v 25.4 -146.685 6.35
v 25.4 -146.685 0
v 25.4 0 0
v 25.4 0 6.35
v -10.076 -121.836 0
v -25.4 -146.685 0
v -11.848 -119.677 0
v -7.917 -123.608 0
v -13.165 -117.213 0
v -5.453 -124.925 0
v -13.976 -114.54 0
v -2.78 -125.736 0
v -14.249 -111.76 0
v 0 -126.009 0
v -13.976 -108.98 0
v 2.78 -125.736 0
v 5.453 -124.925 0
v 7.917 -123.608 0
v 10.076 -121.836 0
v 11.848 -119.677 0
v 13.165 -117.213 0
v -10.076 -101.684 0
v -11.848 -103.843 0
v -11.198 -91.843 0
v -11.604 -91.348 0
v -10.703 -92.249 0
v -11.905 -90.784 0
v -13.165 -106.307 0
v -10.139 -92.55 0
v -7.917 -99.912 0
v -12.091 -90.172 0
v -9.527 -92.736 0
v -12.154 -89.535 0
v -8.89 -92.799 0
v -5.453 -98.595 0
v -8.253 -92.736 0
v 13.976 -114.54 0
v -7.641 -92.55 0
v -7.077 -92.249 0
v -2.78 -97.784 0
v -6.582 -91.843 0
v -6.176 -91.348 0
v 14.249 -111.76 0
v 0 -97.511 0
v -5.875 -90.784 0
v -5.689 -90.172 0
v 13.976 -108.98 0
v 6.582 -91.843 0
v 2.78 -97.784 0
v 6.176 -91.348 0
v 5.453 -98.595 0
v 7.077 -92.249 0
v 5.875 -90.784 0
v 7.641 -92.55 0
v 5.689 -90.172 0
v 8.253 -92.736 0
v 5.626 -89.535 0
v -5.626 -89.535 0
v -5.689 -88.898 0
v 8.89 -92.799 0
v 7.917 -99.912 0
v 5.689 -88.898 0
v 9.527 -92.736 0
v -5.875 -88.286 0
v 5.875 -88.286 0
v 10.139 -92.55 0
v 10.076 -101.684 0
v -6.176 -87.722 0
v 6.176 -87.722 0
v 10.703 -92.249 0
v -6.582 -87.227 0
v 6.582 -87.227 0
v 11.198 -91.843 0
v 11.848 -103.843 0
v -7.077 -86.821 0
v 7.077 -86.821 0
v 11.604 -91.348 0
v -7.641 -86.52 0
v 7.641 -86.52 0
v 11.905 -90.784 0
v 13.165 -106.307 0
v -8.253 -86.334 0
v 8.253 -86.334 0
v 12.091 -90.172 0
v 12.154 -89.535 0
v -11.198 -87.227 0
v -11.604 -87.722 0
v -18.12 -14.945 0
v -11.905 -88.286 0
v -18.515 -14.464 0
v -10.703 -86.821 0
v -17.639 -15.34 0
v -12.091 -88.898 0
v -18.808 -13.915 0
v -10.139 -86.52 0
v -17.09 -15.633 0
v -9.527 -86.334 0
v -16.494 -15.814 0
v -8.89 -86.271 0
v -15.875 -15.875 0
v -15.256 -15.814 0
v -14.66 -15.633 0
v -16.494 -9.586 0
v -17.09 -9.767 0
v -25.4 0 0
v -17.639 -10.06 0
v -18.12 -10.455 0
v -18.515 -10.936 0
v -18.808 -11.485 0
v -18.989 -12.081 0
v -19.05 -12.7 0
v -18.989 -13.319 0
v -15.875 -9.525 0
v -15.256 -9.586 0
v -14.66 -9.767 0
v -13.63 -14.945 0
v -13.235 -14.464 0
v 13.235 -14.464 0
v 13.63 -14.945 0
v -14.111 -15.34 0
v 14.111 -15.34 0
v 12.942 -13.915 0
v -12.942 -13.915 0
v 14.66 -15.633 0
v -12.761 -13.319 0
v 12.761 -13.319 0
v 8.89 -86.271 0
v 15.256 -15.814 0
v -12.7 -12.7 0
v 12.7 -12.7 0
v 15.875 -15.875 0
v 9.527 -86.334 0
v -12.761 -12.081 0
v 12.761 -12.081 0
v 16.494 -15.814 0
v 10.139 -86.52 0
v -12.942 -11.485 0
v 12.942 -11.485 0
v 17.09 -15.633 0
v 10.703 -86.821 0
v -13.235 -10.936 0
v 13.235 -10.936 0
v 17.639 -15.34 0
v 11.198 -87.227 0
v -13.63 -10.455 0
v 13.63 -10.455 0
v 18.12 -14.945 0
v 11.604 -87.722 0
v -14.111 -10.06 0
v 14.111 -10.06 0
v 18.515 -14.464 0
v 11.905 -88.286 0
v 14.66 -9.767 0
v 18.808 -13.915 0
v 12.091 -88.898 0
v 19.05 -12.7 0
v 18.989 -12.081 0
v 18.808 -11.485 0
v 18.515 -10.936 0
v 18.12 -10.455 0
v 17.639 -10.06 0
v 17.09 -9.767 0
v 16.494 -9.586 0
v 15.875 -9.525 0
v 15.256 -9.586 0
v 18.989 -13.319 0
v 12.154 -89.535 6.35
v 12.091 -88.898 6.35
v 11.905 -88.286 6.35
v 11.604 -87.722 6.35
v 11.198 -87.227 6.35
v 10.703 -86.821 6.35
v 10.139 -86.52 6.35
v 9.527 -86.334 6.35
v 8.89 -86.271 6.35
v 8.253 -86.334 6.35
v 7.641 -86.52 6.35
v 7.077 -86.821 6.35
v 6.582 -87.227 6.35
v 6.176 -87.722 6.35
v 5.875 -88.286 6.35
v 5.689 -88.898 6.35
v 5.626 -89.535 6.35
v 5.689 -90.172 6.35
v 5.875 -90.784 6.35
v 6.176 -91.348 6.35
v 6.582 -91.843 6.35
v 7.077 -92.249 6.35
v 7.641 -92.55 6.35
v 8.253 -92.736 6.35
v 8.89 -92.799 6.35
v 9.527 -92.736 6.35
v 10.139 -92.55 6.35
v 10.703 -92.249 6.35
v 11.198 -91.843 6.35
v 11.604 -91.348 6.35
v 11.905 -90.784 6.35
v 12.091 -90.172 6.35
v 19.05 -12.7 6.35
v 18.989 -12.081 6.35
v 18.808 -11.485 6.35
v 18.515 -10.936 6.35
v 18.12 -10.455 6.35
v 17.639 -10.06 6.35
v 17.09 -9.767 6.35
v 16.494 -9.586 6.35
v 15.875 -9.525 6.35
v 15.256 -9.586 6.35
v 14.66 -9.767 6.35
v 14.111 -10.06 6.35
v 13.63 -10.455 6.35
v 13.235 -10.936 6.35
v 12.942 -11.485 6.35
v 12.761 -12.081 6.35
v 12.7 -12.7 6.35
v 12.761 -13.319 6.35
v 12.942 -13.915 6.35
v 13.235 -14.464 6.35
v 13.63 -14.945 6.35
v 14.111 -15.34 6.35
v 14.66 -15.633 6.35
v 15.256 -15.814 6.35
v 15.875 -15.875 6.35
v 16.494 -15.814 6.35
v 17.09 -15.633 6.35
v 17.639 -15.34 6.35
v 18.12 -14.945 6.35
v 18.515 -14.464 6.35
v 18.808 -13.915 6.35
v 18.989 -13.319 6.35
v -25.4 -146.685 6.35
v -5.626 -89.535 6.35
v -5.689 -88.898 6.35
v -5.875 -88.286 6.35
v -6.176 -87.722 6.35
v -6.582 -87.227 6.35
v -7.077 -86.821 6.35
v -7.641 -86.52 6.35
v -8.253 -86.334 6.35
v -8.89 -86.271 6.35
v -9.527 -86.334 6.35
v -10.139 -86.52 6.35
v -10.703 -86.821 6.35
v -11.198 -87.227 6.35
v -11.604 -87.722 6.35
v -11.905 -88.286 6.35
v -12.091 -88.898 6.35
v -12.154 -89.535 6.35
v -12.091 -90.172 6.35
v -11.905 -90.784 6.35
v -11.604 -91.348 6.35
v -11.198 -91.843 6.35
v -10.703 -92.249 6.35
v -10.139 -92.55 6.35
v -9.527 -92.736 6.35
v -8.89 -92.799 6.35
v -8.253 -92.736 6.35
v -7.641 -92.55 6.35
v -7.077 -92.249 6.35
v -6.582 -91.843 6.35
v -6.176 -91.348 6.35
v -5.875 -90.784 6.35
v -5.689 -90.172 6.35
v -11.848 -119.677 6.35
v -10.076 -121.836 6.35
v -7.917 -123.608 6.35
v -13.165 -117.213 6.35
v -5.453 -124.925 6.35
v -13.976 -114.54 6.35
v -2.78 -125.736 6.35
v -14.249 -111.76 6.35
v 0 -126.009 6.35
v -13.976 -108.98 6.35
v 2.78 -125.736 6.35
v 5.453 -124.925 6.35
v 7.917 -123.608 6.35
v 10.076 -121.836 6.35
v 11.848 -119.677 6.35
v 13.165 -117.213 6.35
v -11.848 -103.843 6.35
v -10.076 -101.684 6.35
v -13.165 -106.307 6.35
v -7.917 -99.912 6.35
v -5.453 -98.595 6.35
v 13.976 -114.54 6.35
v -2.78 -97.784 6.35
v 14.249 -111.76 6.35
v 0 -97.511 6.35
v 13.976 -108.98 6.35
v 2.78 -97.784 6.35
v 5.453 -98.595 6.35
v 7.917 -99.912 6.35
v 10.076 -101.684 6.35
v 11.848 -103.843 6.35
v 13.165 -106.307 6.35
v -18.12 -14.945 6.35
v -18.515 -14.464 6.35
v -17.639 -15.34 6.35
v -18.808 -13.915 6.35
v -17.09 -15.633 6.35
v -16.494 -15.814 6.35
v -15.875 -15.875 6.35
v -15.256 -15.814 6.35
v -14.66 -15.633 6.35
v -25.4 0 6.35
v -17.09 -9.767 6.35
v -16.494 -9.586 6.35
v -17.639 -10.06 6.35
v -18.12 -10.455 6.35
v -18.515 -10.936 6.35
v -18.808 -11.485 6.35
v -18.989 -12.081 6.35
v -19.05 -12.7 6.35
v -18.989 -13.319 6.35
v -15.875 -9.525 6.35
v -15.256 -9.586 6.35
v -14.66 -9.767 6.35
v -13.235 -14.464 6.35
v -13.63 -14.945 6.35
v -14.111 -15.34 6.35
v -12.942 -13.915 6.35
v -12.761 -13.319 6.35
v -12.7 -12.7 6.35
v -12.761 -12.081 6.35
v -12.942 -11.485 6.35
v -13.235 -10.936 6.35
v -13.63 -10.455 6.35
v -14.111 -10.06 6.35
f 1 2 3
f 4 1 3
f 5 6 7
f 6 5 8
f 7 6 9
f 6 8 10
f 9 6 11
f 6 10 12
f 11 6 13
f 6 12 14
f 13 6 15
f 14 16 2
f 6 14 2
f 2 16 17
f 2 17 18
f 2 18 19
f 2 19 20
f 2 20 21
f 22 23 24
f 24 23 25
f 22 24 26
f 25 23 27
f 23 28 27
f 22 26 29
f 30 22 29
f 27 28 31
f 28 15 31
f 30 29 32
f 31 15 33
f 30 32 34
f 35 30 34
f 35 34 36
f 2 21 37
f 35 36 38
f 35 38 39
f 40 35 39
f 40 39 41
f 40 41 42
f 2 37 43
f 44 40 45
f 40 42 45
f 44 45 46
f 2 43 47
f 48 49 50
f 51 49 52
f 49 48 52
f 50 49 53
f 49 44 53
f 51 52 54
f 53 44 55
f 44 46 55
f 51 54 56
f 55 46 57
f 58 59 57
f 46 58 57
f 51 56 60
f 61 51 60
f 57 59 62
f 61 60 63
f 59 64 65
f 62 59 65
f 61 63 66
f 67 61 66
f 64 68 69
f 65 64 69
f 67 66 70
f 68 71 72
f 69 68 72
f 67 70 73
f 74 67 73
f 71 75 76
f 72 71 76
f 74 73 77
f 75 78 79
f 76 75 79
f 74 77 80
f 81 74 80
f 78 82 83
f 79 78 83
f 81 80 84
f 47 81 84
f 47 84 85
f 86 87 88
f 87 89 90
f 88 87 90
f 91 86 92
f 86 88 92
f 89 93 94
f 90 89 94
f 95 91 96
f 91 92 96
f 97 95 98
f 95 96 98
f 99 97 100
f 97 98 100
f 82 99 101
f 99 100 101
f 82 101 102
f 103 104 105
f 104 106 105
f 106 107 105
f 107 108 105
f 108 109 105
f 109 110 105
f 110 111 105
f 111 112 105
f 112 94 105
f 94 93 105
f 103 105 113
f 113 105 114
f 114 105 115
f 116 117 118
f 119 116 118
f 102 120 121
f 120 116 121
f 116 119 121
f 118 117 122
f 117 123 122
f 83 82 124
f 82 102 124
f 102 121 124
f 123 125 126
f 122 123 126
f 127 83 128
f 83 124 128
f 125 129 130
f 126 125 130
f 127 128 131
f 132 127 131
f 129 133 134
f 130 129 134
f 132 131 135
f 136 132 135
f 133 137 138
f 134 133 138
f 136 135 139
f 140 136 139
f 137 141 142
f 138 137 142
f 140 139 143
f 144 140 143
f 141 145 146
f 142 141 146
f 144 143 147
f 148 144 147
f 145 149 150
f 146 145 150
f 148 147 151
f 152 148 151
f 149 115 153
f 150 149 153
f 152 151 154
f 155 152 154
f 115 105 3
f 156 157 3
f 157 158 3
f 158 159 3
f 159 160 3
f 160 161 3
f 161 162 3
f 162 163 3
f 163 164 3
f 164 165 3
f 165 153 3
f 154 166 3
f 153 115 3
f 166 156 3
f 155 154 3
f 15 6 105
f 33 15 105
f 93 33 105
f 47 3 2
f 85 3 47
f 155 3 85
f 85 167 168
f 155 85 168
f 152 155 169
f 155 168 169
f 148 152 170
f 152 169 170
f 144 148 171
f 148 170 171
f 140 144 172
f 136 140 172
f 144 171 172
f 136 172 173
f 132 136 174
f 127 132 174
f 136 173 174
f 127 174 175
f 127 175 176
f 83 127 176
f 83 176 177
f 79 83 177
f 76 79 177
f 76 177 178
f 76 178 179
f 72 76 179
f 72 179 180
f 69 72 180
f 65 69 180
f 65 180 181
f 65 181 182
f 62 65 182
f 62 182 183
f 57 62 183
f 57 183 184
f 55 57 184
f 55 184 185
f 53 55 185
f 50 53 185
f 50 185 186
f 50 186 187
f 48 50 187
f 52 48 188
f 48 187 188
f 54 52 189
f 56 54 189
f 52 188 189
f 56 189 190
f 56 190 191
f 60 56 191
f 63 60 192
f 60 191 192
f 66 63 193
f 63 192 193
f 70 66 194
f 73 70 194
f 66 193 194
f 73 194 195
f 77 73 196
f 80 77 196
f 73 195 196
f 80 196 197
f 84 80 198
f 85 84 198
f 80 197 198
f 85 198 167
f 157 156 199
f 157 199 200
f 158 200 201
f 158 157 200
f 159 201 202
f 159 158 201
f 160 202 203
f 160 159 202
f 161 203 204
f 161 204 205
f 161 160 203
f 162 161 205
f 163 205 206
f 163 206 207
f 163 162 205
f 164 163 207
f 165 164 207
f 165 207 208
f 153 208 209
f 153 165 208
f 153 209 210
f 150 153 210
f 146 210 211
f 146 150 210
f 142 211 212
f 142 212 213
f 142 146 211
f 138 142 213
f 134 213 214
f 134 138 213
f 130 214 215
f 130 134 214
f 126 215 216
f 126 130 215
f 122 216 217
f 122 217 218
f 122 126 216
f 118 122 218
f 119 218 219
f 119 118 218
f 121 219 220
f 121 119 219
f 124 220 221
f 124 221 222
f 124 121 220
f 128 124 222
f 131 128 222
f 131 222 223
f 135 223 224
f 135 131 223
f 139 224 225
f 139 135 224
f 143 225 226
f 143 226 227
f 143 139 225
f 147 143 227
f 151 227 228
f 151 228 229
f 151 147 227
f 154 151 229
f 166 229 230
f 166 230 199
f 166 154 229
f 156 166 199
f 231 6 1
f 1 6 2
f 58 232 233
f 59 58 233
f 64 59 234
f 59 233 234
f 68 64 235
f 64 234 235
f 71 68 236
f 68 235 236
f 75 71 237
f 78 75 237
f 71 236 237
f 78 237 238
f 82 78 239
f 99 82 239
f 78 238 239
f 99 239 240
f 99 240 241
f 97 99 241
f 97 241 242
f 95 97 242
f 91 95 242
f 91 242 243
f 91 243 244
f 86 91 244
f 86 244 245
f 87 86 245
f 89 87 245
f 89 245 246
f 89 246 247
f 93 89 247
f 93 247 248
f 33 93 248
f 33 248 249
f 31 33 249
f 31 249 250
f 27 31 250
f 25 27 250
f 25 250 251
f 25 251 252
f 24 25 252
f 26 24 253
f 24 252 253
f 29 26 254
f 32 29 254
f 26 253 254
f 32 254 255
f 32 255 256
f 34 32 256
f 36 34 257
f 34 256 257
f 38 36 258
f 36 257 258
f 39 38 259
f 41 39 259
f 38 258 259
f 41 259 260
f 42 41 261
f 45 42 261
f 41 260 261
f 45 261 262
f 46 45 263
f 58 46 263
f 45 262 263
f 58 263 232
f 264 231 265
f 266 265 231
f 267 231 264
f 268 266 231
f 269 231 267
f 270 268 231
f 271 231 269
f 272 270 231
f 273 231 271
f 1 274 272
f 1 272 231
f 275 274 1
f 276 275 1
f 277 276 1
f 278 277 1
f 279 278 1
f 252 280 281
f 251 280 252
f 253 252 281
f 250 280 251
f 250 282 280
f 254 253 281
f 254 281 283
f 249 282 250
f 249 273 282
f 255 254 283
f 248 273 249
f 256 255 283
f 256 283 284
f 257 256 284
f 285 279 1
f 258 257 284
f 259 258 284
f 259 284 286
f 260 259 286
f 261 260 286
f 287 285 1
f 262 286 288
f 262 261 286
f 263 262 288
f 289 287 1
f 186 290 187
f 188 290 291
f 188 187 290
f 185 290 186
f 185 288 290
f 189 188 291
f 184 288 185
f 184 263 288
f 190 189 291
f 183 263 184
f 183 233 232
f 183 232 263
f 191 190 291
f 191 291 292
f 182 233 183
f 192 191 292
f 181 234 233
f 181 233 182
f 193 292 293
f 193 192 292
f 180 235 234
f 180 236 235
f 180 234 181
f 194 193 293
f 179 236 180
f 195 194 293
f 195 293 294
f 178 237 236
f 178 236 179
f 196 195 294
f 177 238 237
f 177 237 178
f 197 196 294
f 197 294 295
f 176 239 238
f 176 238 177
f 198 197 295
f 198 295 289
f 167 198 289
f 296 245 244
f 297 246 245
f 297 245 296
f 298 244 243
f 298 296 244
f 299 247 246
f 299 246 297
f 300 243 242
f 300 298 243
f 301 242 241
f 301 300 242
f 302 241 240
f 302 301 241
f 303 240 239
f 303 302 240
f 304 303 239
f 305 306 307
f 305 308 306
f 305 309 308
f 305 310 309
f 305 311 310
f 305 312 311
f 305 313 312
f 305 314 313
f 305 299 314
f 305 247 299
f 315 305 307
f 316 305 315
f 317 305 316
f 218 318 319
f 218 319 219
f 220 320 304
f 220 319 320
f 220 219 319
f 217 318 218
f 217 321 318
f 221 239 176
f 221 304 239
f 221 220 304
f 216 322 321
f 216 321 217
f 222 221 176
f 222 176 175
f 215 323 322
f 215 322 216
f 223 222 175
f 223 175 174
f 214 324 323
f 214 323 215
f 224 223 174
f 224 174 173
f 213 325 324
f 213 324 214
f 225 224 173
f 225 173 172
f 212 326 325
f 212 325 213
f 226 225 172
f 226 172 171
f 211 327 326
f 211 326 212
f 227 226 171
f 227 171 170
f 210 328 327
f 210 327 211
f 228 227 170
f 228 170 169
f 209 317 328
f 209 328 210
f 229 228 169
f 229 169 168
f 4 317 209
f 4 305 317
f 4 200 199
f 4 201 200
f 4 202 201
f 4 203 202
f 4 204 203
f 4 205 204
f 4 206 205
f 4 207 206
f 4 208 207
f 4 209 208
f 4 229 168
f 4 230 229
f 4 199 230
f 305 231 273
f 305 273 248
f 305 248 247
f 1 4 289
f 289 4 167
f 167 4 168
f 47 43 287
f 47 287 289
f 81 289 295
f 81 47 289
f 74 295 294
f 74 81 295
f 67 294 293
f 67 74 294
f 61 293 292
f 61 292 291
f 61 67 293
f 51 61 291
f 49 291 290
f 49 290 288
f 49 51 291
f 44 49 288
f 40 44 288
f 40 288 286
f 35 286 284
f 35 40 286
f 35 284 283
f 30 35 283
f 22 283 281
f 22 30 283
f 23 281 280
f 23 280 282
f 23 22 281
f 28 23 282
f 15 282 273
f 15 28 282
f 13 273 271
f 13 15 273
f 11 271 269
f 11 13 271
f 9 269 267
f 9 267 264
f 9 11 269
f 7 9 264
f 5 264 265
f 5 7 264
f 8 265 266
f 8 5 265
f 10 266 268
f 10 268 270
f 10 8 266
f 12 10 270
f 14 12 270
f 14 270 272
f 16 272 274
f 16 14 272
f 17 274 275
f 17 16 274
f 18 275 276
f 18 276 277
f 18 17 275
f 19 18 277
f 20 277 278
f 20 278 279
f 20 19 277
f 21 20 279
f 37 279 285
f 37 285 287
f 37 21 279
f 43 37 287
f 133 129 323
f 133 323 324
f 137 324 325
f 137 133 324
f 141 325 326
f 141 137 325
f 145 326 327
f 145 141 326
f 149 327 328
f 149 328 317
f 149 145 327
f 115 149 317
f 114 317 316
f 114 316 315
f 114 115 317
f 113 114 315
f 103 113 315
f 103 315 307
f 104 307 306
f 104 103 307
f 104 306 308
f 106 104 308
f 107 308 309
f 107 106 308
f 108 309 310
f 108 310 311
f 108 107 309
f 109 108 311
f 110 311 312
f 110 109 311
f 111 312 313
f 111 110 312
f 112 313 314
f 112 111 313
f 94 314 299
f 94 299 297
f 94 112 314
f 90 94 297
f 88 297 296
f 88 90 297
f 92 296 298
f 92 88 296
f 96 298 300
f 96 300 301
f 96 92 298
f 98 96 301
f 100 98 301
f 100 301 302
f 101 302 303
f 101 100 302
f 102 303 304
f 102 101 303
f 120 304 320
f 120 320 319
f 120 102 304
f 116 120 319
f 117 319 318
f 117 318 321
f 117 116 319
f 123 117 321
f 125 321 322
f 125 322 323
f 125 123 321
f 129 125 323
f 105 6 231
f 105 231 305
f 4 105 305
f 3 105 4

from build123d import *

# Parameters (mm, degrees)
SKETCH1_W           = 50.8
SKETCH1_H           = 146.685
SKETCH1_R           = 14.2494
SKETCH1_R_2         = 3.175
BOSS_EXTRUDE3_DEPTH = 6.35
SKETCH2_R           = 3.2639
CUT_EXTRUDE1_DEPTH  = 150.003260786


with BuildPart() as part:
    # Sketch1 → Boss-Extrude3 (new body)
    with BuildSketch(Plane.XY):
        with Locations((0, -73.3425)):
            Rectangle(SKETCH1_W, SKETCH1_H)
        with Locations((0, -111.76)):
            Circle(SKETCH1_R, mode=Mode.SUBTRACT)
        with Locations((-15.875, -12.7)):
            Circle(SKETCH1_R_2, mode=Mode.SUBTRACT)
        with Locations((15.875, -12.7)):
            Circle(SKETCH1_R_2, mode=Mode.SUBTRACT)
    extrude(amount=BOSS_EXTRUDE3_DEPTH)

    # Sketch2 → Cut-Extrude1 (cut, through all)
    with BuildSketch(Plane.XY.offset(6.35)):
        with Locations((8.89, -89.535)):
            Circle(SKETCH2_R)
        with Locations((-8.89, -89.535)):
            Circle(SKETCH2_R)
    extrude(amount=-CUT_EXTRUDE1_DEPTH, mode=Mode.SUBTRACT)


solid = part.part
